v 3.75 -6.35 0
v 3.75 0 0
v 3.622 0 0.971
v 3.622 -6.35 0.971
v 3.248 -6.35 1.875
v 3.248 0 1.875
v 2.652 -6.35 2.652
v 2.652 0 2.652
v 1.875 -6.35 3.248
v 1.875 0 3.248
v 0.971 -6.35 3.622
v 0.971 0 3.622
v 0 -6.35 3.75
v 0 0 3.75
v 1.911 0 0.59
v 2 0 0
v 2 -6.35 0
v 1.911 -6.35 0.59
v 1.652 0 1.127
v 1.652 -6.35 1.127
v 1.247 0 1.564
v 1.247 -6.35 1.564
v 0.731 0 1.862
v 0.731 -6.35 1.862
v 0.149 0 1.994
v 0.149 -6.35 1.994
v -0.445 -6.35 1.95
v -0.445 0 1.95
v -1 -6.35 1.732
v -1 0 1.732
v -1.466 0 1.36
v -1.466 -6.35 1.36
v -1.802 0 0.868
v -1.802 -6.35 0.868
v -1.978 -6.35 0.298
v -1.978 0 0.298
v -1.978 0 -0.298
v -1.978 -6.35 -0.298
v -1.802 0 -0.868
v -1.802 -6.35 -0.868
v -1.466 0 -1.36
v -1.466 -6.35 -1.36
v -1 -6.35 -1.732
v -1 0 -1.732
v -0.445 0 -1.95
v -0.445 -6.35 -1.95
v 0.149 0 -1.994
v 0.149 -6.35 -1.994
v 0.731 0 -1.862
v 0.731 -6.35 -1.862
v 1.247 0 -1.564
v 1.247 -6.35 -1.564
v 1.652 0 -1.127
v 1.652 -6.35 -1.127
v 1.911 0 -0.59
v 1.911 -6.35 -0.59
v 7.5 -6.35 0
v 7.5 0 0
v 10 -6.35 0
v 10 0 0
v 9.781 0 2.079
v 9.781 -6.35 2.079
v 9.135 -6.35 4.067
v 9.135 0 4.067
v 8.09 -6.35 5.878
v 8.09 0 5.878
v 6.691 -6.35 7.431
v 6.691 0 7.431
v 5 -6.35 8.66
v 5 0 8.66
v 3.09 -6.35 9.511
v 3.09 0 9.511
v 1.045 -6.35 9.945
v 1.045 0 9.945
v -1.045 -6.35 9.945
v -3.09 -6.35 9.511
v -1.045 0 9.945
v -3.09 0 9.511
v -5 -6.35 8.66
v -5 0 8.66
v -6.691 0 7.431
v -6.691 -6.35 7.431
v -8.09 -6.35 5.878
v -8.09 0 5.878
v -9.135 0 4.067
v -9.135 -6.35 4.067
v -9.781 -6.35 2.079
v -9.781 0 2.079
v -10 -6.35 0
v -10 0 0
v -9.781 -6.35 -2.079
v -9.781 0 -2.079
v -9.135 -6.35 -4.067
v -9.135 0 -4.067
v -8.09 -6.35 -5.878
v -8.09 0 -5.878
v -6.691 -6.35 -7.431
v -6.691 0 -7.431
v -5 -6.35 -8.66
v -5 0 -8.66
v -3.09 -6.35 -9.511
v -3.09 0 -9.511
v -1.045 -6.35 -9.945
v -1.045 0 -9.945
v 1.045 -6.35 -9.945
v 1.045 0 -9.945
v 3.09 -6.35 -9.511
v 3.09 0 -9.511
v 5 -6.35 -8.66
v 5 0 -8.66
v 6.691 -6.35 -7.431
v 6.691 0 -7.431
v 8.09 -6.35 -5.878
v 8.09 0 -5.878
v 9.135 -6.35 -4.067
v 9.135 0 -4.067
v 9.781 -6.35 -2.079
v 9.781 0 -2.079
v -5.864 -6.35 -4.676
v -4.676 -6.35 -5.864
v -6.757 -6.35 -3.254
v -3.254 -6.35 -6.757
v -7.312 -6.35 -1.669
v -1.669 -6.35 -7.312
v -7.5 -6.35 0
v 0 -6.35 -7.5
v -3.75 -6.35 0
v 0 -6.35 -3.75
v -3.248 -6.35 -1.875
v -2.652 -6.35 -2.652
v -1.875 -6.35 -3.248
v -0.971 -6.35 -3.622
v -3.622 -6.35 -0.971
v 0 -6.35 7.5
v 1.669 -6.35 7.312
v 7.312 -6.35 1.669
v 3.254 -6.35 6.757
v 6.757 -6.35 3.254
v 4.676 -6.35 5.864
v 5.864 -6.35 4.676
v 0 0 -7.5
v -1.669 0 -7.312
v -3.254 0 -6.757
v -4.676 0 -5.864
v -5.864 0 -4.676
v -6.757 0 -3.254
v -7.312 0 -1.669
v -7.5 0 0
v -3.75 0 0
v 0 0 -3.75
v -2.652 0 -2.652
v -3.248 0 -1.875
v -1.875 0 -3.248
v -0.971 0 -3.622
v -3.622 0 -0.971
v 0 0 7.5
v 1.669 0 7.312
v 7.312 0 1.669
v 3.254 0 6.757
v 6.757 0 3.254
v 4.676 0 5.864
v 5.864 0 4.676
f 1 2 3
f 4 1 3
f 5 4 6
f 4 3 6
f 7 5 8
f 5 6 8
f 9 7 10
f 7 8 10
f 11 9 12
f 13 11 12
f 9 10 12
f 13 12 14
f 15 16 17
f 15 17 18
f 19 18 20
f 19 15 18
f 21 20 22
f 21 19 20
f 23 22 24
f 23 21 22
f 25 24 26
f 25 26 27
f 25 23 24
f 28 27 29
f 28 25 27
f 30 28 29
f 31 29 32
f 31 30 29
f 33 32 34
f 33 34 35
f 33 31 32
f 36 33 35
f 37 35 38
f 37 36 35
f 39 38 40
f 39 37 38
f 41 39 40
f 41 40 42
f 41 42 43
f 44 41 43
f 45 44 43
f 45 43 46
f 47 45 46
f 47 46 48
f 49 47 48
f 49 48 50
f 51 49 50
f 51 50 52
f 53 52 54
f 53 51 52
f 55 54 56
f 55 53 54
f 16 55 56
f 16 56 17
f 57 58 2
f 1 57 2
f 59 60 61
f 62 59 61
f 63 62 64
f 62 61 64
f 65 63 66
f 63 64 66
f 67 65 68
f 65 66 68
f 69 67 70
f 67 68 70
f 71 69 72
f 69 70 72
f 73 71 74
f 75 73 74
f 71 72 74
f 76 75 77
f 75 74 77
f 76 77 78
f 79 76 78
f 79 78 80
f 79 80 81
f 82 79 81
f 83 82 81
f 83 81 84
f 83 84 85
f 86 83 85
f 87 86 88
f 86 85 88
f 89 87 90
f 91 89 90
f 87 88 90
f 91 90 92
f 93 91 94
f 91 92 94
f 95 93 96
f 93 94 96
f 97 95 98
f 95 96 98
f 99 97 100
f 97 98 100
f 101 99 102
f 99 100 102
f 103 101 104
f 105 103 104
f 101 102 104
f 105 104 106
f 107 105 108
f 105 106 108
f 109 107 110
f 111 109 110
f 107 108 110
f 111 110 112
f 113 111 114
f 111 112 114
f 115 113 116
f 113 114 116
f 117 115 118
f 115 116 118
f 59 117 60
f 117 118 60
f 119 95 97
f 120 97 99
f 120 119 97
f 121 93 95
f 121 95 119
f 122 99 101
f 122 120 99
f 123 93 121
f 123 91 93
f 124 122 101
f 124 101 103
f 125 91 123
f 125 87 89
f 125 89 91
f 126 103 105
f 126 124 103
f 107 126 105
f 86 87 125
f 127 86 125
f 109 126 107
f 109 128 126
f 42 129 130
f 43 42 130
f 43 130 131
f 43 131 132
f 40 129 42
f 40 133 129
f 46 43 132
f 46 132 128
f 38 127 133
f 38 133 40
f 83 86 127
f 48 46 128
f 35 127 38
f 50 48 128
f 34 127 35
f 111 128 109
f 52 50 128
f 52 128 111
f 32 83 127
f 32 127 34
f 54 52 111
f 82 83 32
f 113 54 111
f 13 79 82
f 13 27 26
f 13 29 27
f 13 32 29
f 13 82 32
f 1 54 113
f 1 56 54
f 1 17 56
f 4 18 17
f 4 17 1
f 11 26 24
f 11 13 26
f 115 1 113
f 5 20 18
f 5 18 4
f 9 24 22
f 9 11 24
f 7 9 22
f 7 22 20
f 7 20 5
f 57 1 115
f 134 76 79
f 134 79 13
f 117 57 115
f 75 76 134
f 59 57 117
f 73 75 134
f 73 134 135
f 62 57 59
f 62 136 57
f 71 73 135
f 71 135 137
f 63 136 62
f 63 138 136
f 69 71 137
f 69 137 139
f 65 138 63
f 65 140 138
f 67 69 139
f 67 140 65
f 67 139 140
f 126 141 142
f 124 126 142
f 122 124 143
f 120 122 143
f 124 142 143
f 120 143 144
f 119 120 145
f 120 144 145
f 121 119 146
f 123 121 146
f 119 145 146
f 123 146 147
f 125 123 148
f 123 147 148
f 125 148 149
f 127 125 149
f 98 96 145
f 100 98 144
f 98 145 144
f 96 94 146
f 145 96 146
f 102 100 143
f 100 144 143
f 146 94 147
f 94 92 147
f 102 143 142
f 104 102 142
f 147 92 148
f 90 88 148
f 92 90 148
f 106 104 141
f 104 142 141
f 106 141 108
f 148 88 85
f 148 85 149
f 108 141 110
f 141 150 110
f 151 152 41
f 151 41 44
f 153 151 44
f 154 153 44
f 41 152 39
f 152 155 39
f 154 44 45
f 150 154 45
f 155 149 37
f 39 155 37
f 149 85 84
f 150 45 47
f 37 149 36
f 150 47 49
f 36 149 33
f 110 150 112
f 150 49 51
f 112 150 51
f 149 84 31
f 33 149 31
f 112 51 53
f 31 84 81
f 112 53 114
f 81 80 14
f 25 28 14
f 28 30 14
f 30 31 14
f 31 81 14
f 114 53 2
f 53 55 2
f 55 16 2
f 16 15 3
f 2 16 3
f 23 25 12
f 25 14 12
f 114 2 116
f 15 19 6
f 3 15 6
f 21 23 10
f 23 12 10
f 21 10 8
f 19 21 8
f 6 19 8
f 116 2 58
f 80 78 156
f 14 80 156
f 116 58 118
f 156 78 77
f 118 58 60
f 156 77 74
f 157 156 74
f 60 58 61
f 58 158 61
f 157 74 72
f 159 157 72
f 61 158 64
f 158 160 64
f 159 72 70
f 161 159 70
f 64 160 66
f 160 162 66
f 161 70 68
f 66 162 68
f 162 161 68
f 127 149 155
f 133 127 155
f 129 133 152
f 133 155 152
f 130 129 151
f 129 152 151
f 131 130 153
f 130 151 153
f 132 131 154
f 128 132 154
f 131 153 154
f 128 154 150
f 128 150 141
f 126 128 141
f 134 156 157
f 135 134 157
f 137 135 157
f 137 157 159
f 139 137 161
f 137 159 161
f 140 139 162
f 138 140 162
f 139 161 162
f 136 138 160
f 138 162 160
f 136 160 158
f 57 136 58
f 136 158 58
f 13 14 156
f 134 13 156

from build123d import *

# Parameters (mm, degrees)
F0_R     = 10
F0_R_2   = 2
F1_DEPTH = 6.35


# Not quite as in the source:
# - a length typed as a fraction of an inch, garbled in the dataset ("3 / 203.2 mm" for 3/8 in), is restored


with BuildPart() as f1:
    # F0 (on Front) → F1 (new body)
    with BuildSketch(Plane.XZ):
        Circle(F0_R)
        with BuildLine():
            ThreePointArc((0, 7.5), (5.3033008589, 5.3033008589), (7.5, 0))
            ThreePointArc((7.5, 0), (5.3033008589, -5.3033008589), (0, -7.5))
            ThreePointArc((0, -7.5), (-5.3033008589, -5.3033008589), (-7.5, 0))
            ThreePointArc((-7.5, 0), (-5.3033008589, 5.3033008589), (0, 7.5))
        make_face(mode=Mode.SUBTRACT)
        with BuildLine():
            ThreePointArc((0, -7.5), (5.3033008589, -5.3033008589), (7.5, 0))
            Line((7.5, 0), (3.75, 0))
            ThreePointArc((3.75, 0), (2.6516504294, -2.6516504294), (0, -3.75))
            Line((0, -3.75), (0, -7.5))
        make_face()
        with BuildLine():
            Line((0, 3.75), (0, 7.5))
            ThreePointArc((0, 7.5), (-5.3033008589, 5.3033008589), (-7.5, 0))
            Line((-7.5, 0), (-3.75, 0))
            ThreePointArc((-3.75, 0), (-2.6516504294, 2.6516504294), (0, 3.75))
        make_face()
        with BuildLine():
            ThreePointArc((0, -3.75), (2.6516504294, -2.6516504294), (3.75, 0))
            ThreePointArc((3.75, 0), (2.6516504294, 2.6516504294), (0, 3.75))
            ThreePointArc((0, 3.75), (-2.6516504294, 2.6516504294), (-3.75, 0))
            ThreePointArc((-3.75, 0), (-2.6516504294, -2.6516504294), (0, -3.75))
        make_face()
        Circle(F0_R_2, mode=Mode.SUBTRACT)
    extrude(amount=F1_DEPTH)


solid = f1.part
